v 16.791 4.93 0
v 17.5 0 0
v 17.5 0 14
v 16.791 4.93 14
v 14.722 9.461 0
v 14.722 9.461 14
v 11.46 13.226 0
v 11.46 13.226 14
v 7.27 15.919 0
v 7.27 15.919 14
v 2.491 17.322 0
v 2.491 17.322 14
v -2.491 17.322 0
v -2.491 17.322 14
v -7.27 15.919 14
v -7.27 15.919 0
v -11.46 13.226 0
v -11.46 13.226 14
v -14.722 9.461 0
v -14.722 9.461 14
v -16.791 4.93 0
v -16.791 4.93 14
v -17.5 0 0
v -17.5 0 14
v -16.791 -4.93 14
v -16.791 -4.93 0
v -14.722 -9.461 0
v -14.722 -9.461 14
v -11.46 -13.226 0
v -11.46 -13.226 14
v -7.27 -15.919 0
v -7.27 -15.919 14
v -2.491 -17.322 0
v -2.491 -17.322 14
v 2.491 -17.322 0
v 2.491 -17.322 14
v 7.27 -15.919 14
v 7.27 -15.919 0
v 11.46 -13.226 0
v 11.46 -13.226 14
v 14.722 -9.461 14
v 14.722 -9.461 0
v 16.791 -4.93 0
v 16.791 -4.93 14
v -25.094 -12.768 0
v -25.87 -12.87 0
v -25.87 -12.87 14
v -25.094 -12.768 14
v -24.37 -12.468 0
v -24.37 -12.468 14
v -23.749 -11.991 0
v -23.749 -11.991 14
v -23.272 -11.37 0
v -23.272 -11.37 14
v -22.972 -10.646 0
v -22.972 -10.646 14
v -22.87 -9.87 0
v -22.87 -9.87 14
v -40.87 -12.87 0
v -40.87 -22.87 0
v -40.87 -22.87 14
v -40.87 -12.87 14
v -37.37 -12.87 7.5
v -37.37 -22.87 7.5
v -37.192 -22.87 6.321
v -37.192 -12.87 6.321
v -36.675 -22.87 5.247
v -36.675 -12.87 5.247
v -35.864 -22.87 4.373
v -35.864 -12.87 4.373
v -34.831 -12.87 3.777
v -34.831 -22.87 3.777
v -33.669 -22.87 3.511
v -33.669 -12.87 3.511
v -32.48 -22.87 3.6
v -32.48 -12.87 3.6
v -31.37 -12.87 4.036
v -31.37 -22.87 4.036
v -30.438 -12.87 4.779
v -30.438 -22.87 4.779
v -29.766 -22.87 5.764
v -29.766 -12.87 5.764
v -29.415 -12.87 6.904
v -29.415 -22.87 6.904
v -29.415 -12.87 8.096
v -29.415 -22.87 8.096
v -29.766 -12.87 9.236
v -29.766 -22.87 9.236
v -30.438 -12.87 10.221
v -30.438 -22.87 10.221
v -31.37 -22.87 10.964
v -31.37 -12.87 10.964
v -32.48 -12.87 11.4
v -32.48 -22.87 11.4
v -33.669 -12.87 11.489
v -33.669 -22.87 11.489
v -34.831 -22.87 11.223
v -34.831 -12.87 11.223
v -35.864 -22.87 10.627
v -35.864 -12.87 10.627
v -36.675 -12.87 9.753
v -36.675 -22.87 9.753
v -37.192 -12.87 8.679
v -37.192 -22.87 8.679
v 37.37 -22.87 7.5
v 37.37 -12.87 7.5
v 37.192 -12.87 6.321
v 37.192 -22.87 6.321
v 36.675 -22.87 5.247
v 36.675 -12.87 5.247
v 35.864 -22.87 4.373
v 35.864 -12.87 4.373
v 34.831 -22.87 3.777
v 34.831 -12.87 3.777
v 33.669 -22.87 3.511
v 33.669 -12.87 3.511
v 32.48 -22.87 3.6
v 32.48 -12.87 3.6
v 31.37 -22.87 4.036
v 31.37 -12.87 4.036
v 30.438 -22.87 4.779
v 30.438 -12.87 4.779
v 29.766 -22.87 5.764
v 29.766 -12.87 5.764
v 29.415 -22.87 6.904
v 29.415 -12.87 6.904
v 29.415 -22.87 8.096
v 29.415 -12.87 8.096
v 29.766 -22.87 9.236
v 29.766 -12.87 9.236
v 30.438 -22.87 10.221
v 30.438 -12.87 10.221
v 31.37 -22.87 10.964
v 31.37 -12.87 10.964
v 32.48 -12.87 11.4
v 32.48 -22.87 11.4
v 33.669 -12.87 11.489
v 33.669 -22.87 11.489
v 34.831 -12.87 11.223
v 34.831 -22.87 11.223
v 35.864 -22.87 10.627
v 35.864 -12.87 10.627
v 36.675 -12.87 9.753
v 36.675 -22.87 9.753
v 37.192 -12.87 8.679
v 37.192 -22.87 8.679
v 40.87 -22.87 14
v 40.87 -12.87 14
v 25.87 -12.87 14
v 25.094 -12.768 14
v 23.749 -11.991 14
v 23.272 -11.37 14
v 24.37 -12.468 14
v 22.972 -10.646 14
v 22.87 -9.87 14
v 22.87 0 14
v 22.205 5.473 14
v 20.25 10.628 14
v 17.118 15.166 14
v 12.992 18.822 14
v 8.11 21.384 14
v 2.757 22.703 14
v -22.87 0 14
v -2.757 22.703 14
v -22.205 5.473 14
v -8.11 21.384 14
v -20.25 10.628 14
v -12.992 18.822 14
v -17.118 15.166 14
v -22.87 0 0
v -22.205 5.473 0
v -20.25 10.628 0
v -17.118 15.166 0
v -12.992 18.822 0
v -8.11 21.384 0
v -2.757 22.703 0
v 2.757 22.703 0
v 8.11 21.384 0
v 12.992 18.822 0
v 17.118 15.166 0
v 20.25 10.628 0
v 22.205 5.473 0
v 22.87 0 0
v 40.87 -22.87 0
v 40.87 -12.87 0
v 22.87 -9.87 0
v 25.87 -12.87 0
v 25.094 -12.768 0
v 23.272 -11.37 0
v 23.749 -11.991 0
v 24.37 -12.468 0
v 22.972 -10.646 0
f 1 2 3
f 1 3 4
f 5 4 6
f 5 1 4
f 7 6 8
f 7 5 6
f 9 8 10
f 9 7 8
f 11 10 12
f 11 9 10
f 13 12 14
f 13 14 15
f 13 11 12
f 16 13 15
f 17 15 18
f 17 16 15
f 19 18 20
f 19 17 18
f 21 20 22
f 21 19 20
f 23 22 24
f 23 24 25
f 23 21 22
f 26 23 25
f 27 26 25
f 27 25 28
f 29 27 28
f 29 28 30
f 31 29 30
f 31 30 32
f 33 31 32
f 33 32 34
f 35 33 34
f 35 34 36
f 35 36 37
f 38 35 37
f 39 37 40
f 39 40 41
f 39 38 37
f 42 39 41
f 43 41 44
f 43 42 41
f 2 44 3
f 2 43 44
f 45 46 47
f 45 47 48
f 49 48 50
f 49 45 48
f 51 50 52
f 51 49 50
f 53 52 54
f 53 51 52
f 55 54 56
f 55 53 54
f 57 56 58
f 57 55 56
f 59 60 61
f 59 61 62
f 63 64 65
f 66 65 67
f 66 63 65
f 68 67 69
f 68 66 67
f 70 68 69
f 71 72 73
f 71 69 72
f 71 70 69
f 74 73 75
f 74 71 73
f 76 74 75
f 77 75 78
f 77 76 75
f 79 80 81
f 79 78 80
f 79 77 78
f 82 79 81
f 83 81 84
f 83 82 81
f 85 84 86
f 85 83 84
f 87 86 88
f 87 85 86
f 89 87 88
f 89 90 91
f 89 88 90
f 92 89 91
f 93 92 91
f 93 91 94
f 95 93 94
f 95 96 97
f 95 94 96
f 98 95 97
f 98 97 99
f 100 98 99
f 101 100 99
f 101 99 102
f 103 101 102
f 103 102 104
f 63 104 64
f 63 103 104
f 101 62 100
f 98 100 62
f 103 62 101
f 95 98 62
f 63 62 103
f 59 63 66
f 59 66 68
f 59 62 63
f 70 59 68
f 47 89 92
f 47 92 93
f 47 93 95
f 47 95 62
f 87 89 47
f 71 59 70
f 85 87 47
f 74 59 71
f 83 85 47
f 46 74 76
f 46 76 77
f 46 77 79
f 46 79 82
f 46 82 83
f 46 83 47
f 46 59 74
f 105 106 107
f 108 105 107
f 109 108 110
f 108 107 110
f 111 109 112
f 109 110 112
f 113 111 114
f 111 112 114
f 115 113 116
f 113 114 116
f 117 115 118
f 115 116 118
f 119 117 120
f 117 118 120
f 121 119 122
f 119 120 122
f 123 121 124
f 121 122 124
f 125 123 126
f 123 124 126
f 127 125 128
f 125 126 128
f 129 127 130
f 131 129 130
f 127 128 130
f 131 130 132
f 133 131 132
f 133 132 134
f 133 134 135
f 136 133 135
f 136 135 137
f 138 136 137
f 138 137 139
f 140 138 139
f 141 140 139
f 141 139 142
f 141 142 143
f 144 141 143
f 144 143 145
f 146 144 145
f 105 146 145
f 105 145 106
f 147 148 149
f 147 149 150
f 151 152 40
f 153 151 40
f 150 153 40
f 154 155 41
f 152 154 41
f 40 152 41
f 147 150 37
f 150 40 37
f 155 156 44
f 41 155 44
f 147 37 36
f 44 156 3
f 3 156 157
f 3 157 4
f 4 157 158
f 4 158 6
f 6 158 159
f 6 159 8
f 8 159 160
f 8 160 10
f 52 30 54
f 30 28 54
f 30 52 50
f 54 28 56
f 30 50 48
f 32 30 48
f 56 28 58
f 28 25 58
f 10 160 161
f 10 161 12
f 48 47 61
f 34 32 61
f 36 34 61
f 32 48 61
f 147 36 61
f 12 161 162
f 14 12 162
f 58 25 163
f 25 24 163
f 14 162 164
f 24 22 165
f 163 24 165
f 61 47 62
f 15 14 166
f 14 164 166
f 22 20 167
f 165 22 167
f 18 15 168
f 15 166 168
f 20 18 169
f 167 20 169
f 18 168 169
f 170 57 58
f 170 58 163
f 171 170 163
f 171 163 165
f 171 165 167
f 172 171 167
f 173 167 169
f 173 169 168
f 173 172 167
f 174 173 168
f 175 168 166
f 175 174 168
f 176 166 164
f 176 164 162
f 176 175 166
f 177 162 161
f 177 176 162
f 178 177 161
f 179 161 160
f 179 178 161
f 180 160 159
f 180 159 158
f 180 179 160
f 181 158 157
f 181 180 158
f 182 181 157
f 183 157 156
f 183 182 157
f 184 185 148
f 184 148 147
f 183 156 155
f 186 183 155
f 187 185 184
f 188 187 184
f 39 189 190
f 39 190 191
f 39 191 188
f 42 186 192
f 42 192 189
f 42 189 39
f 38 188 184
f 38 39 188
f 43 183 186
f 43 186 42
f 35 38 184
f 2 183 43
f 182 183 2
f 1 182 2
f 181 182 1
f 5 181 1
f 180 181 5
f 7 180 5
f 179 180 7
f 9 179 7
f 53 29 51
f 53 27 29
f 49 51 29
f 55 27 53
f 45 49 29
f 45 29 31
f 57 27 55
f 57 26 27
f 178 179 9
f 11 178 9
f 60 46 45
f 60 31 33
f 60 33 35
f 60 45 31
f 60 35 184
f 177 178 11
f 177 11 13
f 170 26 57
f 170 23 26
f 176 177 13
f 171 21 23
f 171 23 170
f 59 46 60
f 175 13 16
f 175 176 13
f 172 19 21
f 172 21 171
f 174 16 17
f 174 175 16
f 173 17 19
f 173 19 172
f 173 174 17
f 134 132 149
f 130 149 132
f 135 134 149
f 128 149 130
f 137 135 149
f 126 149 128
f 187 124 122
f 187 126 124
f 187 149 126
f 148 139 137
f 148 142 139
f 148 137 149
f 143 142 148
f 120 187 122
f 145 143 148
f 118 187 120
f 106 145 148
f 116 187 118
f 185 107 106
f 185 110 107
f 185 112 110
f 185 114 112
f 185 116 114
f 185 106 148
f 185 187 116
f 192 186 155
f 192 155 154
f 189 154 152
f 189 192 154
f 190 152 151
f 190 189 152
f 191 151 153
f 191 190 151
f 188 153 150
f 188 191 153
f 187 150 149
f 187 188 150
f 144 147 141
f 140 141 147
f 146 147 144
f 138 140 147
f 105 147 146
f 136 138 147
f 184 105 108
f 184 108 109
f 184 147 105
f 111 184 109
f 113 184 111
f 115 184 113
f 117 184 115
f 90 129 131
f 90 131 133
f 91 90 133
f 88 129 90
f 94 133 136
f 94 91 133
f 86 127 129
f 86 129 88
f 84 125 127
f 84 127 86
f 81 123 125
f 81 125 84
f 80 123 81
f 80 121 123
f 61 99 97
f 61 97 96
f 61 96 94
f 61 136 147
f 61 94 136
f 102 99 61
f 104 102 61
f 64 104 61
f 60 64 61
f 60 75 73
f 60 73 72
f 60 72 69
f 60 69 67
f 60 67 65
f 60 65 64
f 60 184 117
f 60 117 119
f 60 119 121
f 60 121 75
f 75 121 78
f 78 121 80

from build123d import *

# Parameters (mm, degrees)
SKETCH1_R           = 17.5
BOSS_EXTRUDE1_DEPTH = 14
SKETCH2_R           = 4
CUT_EXTRUDE1_DEPTH  = 11


with BuildPart() as part:
    # Sketch1 → Boss-Extrude1 (new body)
    with BuildSketch(Plane.XY):
        with BuildLine():
            Line((40.87, -22.87), (-40.87, -22.87))
            Line((-40.87, -22.87), (-40.87, -12.87))
            Line((-40.87, -12.87), (-25.87, -12.87))
            ThreePointArc((-25.87, -12.87), (-23.748679656, -11.991320344), (-22.87, -9.87))
            Line((-22.87, -9.87), (-22.87, 0))
            ThreePointArc((-22.87, 0), (0, 22.87), (22.87, 0))
            Line((22.87, 0), (22.87, -9.87))
            ThreePointArc((22.87, -9.87), (23.748679656, -11.991320344), (25.87, -12.87))
            Line((25.87, -12.87), (40.87, -12.87))
            Line((40.87, -12.87), (40.87, -22.87))
        make_face()
        Circle(SKETCH1_R, mode=Mode.SUBTRACT)
    extrude(amount=BOSS_EXTRUDE1_DEPTH)

    # Sketch2 → Cut-Extrude1 (cut, through all)
    with BuildSketch(Plane(origin=(0, -12.87, 0), x_dir=(1, 0, 0), z_dir=(0, 1, 0))):
        with Locations((33.37, -7.5)):
            Circle(SKETCH2_R)
    cut_extrude1 = extrude(amount=-CUT_EXTRUDE1_DEPTH, mode=Mode.SUBTRACT)

    # Mirror1: Cut-Extrude1 across plane
    add(cut_extrude1.mirror(Plane(origin=(0, 0, 0), x_dir=(0, 0, 1), z_dir=(1, 0, 0))), mode=Mode.SUBTRACT)


solid = part.part
